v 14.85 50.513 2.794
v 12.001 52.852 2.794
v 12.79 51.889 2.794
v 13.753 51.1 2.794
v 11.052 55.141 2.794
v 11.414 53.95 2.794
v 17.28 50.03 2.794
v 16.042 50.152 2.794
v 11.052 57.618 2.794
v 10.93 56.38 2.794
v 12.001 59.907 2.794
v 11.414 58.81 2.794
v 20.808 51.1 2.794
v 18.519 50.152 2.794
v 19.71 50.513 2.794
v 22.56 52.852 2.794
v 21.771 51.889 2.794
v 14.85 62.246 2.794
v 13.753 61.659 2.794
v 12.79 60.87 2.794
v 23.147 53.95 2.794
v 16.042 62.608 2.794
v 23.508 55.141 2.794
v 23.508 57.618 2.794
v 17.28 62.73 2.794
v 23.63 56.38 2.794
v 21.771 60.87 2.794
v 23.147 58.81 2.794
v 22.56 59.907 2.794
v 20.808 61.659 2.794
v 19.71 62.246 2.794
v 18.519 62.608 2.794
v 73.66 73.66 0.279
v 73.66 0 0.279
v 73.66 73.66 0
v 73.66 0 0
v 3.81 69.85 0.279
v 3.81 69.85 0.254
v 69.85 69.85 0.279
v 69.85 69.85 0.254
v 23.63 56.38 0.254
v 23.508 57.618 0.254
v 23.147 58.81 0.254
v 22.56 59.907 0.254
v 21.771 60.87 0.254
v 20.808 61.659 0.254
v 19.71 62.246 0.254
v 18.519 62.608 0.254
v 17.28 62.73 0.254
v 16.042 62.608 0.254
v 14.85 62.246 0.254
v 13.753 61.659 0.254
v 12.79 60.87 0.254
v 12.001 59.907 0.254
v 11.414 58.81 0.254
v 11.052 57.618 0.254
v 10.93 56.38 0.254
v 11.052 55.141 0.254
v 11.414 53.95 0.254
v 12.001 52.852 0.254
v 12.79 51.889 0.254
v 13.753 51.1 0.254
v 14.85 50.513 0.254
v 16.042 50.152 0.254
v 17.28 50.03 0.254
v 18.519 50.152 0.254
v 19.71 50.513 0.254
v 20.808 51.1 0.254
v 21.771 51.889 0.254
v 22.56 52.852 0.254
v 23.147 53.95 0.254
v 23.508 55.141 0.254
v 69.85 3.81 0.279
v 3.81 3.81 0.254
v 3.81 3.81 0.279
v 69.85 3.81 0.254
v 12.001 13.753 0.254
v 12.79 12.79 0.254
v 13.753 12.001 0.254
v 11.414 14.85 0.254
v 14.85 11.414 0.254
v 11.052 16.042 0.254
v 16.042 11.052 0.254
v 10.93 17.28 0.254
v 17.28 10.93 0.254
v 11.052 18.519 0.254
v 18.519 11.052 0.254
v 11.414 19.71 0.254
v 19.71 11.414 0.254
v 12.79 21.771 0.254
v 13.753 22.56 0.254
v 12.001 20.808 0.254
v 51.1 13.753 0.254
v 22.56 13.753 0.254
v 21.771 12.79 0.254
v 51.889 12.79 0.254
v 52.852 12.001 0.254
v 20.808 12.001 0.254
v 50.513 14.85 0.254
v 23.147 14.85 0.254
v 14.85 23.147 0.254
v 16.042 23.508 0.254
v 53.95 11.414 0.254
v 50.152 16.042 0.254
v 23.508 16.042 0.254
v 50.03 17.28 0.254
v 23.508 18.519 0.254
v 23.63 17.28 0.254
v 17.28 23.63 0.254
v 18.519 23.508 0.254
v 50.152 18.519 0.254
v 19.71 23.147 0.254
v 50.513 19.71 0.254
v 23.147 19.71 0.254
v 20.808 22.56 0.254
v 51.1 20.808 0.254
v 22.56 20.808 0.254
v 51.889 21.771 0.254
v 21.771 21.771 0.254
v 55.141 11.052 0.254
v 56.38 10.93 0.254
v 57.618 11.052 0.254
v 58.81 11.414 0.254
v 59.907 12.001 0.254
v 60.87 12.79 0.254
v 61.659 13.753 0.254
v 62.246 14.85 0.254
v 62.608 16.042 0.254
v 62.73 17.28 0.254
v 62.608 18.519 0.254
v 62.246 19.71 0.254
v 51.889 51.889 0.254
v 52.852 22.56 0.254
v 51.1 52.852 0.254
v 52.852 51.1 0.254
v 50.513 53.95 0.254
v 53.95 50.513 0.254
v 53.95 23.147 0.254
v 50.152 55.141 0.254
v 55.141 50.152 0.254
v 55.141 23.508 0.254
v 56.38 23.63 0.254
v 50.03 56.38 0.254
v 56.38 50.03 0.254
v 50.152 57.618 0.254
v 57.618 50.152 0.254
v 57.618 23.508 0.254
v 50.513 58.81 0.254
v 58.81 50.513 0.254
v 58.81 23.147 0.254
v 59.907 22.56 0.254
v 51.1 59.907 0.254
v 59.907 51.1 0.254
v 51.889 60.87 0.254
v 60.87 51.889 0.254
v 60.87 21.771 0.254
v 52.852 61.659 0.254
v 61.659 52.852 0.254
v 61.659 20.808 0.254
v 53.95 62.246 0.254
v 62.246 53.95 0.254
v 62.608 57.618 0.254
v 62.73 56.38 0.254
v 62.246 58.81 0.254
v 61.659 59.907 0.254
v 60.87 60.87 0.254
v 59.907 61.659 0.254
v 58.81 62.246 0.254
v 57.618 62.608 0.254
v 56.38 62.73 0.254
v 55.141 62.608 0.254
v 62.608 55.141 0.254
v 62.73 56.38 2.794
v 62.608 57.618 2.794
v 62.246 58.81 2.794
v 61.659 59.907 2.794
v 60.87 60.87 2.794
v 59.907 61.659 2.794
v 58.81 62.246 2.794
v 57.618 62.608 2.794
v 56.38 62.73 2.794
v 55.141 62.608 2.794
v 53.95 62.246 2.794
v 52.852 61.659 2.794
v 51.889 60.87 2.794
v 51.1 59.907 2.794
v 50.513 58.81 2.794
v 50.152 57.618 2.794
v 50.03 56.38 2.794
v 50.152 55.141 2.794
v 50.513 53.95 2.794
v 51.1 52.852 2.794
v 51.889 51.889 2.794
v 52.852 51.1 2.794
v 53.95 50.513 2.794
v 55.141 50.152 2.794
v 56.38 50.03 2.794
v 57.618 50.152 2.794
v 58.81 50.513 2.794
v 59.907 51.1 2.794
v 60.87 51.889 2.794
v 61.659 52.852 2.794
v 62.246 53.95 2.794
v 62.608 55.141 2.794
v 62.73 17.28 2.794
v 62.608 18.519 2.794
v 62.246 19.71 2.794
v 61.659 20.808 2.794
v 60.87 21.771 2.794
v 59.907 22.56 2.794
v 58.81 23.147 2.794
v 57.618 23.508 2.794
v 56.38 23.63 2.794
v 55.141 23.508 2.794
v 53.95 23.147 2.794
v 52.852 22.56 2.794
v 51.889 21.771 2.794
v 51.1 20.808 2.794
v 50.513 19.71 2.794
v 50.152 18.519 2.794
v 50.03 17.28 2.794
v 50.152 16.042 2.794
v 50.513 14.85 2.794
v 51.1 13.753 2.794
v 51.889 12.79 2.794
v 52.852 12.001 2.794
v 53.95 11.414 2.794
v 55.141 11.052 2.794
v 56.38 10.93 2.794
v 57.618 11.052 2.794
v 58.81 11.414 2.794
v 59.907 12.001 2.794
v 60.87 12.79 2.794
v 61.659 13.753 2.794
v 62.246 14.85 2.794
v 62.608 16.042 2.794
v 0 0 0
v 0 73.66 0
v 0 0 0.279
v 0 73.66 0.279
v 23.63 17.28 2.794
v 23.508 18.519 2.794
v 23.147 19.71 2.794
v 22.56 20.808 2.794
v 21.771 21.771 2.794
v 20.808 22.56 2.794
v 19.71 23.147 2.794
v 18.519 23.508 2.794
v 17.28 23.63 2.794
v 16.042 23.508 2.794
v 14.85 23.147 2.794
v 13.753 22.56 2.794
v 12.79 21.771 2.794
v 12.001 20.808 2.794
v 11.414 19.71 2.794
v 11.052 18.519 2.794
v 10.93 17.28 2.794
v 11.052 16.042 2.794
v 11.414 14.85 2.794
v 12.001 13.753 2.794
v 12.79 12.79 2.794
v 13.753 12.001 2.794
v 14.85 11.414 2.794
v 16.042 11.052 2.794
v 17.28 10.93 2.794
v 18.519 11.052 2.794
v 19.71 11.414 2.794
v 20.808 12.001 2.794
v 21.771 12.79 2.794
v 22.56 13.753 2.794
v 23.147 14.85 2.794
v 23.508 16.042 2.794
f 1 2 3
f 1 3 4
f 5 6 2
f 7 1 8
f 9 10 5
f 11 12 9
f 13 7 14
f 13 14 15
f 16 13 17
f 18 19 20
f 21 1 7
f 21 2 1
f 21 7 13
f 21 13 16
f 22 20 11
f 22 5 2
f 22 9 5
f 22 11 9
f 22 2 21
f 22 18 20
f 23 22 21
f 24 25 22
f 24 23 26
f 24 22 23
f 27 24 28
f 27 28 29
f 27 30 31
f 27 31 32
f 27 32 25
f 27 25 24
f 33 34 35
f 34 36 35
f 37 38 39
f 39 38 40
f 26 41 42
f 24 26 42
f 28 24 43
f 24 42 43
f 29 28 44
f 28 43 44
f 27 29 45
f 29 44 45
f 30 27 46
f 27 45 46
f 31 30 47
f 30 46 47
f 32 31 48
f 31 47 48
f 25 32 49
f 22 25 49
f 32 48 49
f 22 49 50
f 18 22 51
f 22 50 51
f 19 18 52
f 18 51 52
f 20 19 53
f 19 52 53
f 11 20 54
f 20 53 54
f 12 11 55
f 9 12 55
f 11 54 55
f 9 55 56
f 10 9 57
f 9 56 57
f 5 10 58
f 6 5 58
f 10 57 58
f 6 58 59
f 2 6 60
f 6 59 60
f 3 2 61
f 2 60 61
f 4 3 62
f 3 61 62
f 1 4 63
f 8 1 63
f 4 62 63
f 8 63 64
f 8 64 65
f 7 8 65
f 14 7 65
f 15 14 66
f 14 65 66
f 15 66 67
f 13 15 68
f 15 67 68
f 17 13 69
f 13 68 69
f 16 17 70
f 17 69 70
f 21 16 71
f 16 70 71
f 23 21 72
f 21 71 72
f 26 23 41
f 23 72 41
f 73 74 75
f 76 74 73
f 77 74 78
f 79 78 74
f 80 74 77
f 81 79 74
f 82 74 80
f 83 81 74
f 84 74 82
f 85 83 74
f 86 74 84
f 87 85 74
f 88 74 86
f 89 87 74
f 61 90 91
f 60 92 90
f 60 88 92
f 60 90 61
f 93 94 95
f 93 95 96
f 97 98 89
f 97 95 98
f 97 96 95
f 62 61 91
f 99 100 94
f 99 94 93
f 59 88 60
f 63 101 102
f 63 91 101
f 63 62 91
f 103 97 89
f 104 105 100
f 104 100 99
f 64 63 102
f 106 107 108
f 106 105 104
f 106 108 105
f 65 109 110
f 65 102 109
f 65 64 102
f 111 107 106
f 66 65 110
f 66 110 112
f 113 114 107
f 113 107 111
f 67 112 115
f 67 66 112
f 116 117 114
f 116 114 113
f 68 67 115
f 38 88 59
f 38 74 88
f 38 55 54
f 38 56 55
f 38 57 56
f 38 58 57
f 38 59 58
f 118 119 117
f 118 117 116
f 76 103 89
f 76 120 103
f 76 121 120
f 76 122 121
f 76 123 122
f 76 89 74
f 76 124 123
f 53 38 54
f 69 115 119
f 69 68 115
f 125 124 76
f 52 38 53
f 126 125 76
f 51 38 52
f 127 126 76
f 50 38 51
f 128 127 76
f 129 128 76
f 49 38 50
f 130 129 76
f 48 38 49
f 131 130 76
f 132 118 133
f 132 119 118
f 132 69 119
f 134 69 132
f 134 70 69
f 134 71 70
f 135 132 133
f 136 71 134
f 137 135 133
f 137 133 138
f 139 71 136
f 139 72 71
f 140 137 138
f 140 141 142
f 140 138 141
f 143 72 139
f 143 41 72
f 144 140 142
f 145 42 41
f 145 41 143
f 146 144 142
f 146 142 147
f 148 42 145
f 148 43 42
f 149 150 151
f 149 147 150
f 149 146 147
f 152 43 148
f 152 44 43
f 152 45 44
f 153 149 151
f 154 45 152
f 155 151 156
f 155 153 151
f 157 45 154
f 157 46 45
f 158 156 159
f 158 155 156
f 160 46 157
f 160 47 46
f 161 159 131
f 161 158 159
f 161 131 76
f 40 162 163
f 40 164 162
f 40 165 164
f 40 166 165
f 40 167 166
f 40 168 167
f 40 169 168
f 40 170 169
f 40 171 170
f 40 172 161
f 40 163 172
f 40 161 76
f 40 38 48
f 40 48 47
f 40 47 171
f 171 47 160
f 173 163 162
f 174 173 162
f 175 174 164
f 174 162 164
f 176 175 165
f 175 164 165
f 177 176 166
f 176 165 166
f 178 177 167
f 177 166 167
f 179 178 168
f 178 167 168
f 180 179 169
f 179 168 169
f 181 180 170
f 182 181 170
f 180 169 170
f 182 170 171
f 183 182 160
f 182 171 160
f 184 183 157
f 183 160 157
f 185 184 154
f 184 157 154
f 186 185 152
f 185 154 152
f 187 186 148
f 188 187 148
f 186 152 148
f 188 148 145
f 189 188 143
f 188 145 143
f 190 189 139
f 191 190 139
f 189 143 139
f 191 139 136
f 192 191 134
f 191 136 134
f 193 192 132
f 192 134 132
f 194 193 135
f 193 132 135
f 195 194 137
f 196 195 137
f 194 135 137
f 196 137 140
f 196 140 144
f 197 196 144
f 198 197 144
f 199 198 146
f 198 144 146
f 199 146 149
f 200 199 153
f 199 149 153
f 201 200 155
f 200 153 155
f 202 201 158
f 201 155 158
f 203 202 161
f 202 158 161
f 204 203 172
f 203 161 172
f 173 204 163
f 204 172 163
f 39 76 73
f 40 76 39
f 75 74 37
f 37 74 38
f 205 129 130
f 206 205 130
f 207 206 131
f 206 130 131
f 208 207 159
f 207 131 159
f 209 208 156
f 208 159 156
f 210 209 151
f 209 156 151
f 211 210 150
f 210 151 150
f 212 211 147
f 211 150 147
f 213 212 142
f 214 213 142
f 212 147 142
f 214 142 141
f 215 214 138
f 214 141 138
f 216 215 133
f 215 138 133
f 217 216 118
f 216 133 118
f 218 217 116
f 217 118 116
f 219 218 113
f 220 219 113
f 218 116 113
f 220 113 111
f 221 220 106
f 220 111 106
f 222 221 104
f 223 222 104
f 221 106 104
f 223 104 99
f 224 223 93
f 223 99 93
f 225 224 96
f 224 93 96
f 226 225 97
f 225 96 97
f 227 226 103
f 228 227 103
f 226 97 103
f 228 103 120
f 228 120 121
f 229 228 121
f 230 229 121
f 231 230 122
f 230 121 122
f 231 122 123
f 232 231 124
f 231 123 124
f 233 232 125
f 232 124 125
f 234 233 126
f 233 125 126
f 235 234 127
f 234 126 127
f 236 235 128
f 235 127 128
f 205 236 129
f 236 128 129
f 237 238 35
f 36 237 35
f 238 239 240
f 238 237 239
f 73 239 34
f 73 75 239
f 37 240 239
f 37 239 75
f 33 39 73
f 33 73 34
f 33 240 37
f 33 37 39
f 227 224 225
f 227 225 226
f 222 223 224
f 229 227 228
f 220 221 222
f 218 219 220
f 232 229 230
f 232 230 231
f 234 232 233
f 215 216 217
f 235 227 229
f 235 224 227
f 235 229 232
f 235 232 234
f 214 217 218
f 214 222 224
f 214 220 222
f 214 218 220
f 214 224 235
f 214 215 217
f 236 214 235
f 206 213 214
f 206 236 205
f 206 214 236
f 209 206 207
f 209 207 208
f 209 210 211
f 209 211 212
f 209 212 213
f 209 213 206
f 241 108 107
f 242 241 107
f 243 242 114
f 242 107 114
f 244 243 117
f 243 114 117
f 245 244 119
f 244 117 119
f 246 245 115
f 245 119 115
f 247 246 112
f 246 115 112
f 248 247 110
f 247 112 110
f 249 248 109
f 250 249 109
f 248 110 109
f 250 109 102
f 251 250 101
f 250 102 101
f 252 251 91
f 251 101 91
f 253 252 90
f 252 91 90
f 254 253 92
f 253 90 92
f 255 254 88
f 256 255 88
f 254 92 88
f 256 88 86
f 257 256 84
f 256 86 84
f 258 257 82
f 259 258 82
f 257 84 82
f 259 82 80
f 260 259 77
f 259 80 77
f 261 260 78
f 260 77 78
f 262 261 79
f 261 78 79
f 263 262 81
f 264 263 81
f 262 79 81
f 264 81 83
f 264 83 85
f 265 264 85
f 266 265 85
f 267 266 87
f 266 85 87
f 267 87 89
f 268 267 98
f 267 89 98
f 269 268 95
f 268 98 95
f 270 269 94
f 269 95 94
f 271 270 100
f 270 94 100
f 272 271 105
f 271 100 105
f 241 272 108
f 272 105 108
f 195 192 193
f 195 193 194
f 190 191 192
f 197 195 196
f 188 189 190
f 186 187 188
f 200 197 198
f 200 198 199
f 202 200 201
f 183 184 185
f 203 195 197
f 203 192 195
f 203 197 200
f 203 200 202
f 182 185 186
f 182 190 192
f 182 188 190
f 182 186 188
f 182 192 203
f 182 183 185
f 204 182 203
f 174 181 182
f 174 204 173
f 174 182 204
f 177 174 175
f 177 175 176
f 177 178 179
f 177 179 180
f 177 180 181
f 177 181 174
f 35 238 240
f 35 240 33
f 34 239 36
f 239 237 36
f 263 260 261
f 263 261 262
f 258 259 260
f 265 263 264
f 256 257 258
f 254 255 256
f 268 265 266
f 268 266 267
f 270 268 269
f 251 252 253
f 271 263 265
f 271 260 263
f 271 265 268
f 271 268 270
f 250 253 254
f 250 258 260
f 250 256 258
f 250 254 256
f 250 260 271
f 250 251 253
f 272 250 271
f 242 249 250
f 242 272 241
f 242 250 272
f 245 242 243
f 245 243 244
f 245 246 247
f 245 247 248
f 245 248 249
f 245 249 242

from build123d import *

# Parameters (mm, degrees)
F0_W     = 73.66
F0_H     = 73.66
F1_DEPTH = 0.254
F2_W     = 73.66
F2_H     = 73.66
F2_W_2   = 66.04
F2_H_2   = 66.04
F3_DEPTH = 0.0254
F4_R     = 6.35
F5_DEPTH = 2.54


with BuildPart() as f1:
    # F0 (on Top) → F1 (new body)
    with BuildSketch(Plane.XY):
        with Locations((36.83, 36.83)):
            Rectangle(F0_W, F0_H)
    extrude(amount=F1_DEPTH)

    # F2 (on face) → F3 (join)
    with BuildSketch(Plane.XY.offset(0.254)):
        with Locations((36.83, 36.83)):
            Rectangle(F2_W, F2_H)
        with Locations((36.83, 36.83)):
            Rectangle(F2_W_2, F2_H_2, mode=Mode.SUBTRACT)
    extrude(amount=F3_DEPTH)

    # F4 (on face) → F5 (join)
    with BuildSketch(Plane.XY.offset(0.254)):
        with Locations((17.280384, 56.379616)):
            Circle(F4_R)
        with Locations((17.280384, 17.280384)):
            Circle(F4_R)
        with Locations((56.379616, 17.280384)):
            Circle(F4_R)
        with Locations((56.379616, 56.379616)):
            Circle(F4_R)
    extrude(amount=F5_DEPTH)


solid = f1.part
